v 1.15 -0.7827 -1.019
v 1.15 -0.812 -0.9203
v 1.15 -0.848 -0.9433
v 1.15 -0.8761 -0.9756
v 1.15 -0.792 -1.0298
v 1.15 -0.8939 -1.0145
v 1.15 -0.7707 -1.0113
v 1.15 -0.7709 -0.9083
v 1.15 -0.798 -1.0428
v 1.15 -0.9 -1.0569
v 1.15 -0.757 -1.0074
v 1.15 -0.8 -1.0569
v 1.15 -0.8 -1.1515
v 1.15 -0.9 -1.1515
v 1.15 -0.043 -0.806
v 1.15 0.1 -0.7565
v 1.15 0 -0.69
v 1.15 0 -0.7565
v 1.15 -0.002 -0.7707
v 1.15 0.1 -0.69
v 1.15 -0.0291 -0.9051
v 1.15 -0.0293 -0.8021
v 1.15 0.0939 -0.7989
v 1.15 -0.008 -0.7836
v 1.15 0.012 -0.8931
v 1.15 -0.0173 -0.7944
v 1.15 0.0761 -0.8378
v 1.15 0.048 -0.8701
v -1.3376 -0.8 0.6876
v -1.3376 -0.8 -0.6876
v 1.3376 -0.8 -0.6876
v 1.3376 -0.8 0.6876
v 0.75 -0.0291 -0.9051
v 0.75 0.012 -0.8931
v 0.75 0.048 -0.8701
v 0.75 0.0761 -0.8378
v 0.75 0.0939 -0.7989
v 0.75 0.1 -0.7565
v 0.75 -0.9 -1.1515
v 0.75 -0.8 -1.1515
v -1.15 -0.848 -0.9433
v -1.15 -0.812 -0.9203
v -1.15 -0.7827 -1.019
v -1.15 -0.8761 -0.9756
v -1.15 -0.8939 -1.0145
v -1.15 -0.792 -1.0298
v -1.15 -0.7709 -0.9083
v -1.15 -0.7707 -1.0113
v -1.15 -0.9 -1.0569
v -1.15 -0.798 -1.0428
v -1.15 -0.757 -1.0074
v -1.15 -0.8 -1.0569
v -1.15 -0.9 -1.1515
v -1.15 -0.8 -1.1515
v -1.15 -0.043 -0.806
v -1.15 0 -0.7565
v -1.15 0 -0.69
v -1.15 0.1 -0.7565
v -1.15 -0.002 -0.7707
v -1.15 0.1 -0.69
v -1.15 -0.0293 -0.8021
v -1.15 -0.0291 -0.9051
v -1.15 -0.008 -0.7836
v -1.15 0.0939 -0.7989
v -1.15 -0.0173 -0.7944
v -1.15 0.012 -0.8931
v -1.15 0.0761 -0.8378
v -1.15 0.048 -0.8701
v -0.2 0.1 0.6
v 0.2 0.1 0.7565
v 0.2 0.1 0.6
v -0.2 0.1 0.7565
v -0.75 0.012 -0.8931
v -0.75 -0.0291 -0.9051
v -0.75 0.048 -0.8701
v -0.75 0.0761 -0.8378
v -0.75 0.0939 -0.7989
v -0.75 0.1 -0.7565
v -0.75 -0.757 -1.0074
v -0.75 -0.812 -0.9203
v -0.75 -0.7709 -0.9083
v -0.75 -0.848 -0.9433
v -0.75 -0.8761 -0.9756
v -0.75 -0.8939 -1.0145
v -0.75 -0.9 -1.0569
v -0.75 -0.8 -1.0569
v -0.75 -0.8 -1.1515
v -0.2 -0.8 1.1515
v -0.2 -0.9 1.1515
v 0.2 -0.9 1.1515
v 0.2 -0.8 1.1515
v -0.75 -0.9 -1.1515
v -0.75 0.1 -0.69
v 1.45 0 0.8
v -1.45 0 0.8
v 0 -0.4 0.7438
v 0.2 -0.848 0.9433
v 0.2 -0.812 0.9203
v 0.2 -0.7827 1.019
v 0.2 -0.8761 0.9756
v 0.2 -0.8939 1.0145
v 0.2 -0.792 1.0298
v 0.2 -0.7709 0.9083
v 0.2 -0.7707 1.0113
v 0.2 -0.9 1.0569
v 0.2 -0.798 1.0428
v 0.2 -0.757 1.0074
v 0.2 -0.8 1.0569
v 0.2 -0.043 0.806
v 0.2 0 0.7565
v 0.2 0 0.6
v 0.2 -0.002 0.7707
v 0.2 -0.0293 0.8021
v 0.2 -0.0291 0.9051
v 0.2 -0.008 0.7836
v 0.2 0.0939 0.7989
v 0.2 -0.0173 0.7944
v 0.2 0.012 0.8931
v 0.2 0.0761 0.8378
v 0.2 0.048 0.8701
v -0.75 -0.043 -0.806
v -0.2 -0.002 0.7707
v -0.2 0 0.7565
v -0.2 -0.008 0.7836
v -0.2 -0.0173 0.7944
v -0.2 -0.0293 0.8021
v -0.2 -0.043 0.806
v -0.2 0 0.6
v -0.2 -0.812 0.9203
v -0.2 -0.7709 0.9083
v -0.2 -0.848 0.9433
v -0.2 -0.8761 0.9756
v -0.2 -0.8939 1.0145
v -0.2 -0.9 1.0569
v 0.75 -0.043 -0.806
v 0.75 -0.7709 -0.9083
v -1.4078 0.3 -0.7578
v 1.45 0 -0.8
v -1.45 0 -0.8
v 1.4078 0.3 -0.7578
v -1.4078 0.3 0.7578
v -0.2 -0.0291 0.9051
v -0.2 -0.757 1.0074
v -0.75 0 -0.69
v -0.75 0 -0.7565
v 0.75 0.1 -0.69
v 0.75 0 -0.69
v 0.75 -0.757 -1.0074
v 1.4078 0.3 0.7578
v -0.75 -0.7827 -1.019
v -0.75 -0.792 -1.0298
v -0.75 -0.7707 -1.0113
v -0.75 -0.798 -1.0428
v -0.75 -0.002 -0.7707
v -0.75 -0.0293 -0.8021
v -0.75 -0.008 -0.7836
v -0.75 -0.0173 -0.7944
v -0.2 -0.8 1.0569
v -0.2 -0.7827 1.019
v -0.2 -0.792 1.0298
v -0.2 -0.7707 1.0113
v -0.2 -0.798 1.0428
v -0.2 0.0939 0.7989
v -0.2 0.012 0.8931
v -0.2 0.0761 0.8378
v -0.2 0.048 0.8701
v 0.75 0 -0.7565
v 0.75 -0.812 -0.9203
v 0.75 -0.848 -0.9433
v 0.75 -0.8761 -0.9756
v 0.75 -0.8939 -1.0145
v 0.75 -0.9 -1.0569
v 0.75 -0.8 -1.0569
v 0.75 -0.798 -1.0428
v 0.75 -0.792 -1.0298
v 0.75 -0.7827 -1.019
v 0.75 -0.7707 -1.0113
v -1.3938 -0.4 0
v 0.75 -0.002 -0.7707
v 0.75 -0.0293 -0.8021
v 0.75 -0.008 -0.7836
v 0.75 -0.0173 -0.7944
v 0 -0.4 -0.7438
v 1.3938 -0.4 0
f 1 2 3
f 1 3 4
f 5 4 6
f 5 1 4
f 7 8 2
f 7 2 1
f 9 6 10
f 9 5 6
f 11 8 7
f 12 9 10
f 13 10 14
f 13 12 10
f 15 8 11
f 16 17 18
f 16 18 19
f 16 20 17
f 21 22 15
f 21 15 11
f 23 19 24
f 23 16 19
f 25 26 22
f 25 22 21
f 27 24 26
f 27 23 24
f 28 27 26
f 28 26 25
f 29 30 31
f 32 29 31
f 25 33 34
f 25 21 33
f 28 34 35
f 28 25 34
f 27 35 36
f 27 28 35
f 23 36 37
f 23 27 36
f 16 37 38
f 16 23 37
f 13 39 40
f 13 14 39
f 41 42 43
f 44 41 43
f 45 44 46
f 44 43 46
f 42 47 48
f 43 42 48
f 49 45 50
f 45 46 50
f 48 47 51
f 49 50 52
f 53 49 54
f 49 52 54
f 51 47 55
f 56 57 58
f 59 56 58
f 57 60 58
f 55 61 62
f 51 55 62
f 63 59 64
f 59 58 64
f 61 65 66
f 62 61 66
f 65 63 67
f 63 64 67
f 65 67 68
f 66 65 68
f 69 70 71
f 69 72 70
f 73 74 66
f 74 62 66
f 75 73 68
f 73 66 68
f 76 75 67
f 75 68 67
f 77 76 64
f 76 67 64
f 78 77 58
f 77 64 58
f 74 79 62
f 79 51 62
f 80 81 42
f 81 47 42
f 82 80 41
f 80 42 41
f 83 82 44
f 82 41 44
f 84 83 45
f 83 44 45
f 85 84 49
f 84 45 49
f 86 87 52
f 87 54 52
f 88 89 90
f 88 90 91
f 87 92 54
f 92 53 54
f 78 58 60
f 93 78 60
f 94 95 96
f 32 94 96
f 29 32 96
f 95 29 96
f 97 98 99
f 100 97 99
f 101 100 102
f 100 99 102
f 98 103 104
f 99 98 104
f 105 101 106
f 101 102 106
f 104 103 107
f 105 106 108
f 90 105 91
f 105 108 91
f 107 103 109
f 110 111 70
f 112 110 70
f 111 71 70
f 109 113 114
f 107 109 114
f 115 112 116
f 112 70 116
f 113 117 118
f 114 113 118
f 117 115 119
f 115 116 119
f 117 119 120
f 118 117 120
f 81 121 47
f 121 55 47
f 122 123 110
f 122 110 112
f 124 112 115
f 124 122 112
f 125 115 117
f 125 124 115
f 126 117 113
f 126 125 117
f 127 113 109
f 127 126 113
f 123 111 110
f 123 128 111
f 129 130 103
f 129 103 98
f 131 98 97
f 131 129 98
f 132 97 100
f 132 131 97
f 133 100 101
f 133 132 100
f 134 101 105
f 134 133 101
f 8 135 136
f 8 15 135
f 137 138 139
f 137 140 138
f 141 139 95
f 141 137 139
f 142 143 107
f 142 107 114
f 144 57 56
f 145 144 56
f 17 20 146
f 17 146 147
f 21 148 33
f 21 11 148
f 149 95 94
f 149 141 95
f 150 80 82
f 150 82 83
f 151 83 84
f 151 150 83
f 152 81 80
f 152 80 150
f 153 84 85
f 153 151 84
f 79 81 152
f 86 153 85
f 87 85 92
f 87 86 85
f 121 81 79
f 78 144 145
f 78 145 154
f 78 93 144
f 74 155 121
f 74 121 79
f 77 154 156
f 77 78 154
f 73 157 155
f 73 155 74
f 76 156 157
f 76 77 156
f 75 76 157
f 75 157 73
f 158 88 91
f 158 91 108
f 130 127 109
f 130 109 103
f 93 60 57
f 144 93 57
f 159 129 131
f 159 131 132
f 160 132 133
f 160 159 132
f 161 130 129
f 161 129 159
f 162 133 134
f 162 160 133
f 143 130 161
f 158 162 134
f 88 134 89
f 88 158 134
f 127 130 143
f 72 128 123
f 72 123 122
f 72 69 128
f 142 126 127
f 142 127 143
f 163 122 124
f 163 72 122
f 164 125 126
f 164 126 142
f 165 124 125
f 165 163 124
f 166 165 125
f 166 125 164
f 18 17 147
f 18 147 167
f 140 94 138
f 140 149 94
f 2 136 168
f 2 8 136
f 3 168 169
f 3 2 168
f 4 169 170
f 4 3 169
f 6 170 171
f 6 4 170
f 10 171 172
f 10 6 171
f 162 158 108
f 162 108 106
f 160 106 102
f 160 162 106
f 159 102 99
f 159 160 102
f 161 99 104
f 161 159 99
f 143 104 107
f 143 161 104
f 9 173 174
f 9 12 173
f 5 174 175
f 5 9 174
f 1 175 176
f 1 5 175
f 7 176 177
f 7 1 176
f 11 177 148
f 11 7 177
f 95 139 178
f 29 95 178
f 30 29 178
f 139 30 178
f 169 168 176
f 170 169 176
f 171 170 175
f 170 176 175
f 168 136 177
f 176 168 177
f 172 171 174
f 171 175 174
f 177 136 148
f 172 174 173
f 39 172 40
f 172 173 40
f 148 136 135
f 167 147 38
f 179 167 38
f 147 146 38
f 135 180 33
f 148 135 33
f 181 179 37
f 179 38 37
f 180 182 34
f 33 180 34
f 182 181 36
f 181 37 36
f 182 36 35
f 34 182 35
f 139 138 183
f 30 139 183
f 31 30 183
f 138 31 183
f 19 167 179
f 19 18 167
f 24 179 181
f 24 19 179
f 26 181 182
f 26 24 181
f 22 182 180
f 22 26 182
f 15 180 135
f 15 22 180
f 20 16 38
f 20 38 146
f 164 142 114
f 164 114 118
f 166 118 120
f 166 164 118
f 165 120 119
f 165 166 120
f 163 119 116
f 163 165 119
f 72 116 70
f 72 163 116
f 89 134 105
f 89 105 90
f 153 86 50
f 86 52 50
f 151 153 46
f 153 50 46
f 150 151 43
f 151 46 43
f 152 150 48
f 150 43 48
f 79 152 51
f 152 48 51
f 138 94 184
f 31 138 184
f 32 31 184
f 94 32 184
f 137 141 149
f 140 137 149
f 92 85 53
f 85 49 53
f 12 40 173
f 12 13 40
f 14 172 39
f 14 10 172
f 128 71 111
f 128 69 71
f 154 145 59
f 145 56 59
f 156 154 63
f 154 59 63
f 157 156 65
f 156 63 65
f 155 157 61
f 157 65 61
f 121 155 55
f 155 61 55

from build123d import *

# Parameters (mm, degrees)
SKETCH1_W                     = 2.9
SKETCH1_H                     = 1.6
BOSS_EXTRUDE1_DEPTH           = 0.3
BOSS_EXTRUDE1_TAPER           = 8
BOSS_EXTRUDE1_OTHER_WAY_DEPTH = 0.8
BOSS_EXTRUDE1_OTHER_WAY_TAPER = 8
BASE_FLANGE2_DEPTH            = 0.2
BASE_FLANGE3_DEPTH            = 0.2


# Sheet-metal steps are written as plain solids
with BuildPart() as part:
    # Sketch1 → Boss-Extrude1 (new body)
    with BuildSketch(Plane(origin=(0, 0, 0), x_dir=(1, 0, 0), z_dir=(0, 1, 0))):
        Rectangle(SKETCH1_W, SKETCH1_H)
    extrude(amount=BOSS_EXTRUDE1_DEPTH, taper=BOSS_EXTRUDE1_TAPER)

    # Sketch1 → Boss-Extrude1 other way (add)
    with BuildSketch(Plane(origin=(0, 0, 0), x_dir=(1, 0, 0), z_dir=(0, 1, 0))):
        Rectangle(SKETCH1_W, SKETCH1_H)
    extrude(amount=-BOSS_EXTRUDE1_OTHER_WAY_DEPTH, taper=BOSS_EXTRUDE1_OTHER_WAY_TAPER)


with BuildPart() as body_2:
    # Sketch2 → Base-Flange2 (new, symmetric)
    with BuildSketch(Plane.ZY):
        with BuildLine():
            Line((0.6, 0), (0.756535663, 0))
            ThreePointArc((0.756535663, 0), (0.789338615, -0.012264521), (0.806049067, -0.043041345))
            Line((0.806049067, -0.043041345), (0.908339552, -0.770875965))
            ThreePointArc((0.908339552, -0.770875965), (0.958470908, -0.863206437), (1.056879762, -0.9))
            Line((1.056879762, -0.9), (1.151486751, -0.9))
            Line((1.151486751, -0.9), (1.151486751, -0.8))
            Line((1.151486751, -0.8), (1.056879762, -0.8))
            ThreePointArc((1.056879762, -0.8), (1.02407681, -0.787735479), (1.007366358, -0.756958655))
            Line((1.007366358, -0.756958655), (0.905075873, -0.029124035))
            ThreePointArc((0.905075873, -0.029124035), (0.854944517, 0.063206437), (0.756535663, 0.1))
            Line((0.756535663, 0.1), (0.6, 0.1))
            Line((0.6, 0.1), (0.6, 0))
        make_face()
    extrude(amount=BASE_FLANGE2_DEPTH, both=True)


with BuildPart() as body_3:
    # Sketch11 → Base-Flange3 (new, symmetric)
    with BuildSketch(Plane.ZY.offset(0.95)):
        with BuildLine():
            Line((-0.69, 0), (-0.756535663, 0))
            ThreePointArc((-0.756535663, 0), (-0.789338615, -0.012264521), (-0.806049067, -0.043041345))
            Line((-0.806049067, -0.043041345), (-0.908339552, -0.770875965))
            ThreePointArc((-0.908339552, -0.770875965), (-0.958470908, -0.863206437), (-1.056879762, -0.9))
            Line((-1.056879762, -0.9), (-1.151486751, -0.9))
            Line((-1.151486751, -0.9), (-1.151486751, -0.8))
            Line((-1.151486751, -0.8), (-1.056879762, -0.8))
            ThreePointArc((-1.056879762, -0.8), (-1.02407681, -0.787735479), (-1.007366358, -0.756958655))
            Line((-1.007366358, -0.756958655), (-0.905075873, -0.029124035))
            ThreePointArc((-0.905075873, -0.029124035), (-0.854944517, 0.063206437), (-0.756535663, 0.1))
            Line((-0.756535663, 0.1), (-0.69, 0.1))
            Line((-0.69, 0.1), (-0.69, 0))
        make_face()
    extrude(amount=BASE_FLANGE3_DEPTH, both=True)


with BuildPart() as body_4:
    # Mirror1: mirrored copy
    add(body_3.part.mirror(Plane.ZY))


solid = Compound([part.part, body_2.part, body_3.part, body_4.part])
